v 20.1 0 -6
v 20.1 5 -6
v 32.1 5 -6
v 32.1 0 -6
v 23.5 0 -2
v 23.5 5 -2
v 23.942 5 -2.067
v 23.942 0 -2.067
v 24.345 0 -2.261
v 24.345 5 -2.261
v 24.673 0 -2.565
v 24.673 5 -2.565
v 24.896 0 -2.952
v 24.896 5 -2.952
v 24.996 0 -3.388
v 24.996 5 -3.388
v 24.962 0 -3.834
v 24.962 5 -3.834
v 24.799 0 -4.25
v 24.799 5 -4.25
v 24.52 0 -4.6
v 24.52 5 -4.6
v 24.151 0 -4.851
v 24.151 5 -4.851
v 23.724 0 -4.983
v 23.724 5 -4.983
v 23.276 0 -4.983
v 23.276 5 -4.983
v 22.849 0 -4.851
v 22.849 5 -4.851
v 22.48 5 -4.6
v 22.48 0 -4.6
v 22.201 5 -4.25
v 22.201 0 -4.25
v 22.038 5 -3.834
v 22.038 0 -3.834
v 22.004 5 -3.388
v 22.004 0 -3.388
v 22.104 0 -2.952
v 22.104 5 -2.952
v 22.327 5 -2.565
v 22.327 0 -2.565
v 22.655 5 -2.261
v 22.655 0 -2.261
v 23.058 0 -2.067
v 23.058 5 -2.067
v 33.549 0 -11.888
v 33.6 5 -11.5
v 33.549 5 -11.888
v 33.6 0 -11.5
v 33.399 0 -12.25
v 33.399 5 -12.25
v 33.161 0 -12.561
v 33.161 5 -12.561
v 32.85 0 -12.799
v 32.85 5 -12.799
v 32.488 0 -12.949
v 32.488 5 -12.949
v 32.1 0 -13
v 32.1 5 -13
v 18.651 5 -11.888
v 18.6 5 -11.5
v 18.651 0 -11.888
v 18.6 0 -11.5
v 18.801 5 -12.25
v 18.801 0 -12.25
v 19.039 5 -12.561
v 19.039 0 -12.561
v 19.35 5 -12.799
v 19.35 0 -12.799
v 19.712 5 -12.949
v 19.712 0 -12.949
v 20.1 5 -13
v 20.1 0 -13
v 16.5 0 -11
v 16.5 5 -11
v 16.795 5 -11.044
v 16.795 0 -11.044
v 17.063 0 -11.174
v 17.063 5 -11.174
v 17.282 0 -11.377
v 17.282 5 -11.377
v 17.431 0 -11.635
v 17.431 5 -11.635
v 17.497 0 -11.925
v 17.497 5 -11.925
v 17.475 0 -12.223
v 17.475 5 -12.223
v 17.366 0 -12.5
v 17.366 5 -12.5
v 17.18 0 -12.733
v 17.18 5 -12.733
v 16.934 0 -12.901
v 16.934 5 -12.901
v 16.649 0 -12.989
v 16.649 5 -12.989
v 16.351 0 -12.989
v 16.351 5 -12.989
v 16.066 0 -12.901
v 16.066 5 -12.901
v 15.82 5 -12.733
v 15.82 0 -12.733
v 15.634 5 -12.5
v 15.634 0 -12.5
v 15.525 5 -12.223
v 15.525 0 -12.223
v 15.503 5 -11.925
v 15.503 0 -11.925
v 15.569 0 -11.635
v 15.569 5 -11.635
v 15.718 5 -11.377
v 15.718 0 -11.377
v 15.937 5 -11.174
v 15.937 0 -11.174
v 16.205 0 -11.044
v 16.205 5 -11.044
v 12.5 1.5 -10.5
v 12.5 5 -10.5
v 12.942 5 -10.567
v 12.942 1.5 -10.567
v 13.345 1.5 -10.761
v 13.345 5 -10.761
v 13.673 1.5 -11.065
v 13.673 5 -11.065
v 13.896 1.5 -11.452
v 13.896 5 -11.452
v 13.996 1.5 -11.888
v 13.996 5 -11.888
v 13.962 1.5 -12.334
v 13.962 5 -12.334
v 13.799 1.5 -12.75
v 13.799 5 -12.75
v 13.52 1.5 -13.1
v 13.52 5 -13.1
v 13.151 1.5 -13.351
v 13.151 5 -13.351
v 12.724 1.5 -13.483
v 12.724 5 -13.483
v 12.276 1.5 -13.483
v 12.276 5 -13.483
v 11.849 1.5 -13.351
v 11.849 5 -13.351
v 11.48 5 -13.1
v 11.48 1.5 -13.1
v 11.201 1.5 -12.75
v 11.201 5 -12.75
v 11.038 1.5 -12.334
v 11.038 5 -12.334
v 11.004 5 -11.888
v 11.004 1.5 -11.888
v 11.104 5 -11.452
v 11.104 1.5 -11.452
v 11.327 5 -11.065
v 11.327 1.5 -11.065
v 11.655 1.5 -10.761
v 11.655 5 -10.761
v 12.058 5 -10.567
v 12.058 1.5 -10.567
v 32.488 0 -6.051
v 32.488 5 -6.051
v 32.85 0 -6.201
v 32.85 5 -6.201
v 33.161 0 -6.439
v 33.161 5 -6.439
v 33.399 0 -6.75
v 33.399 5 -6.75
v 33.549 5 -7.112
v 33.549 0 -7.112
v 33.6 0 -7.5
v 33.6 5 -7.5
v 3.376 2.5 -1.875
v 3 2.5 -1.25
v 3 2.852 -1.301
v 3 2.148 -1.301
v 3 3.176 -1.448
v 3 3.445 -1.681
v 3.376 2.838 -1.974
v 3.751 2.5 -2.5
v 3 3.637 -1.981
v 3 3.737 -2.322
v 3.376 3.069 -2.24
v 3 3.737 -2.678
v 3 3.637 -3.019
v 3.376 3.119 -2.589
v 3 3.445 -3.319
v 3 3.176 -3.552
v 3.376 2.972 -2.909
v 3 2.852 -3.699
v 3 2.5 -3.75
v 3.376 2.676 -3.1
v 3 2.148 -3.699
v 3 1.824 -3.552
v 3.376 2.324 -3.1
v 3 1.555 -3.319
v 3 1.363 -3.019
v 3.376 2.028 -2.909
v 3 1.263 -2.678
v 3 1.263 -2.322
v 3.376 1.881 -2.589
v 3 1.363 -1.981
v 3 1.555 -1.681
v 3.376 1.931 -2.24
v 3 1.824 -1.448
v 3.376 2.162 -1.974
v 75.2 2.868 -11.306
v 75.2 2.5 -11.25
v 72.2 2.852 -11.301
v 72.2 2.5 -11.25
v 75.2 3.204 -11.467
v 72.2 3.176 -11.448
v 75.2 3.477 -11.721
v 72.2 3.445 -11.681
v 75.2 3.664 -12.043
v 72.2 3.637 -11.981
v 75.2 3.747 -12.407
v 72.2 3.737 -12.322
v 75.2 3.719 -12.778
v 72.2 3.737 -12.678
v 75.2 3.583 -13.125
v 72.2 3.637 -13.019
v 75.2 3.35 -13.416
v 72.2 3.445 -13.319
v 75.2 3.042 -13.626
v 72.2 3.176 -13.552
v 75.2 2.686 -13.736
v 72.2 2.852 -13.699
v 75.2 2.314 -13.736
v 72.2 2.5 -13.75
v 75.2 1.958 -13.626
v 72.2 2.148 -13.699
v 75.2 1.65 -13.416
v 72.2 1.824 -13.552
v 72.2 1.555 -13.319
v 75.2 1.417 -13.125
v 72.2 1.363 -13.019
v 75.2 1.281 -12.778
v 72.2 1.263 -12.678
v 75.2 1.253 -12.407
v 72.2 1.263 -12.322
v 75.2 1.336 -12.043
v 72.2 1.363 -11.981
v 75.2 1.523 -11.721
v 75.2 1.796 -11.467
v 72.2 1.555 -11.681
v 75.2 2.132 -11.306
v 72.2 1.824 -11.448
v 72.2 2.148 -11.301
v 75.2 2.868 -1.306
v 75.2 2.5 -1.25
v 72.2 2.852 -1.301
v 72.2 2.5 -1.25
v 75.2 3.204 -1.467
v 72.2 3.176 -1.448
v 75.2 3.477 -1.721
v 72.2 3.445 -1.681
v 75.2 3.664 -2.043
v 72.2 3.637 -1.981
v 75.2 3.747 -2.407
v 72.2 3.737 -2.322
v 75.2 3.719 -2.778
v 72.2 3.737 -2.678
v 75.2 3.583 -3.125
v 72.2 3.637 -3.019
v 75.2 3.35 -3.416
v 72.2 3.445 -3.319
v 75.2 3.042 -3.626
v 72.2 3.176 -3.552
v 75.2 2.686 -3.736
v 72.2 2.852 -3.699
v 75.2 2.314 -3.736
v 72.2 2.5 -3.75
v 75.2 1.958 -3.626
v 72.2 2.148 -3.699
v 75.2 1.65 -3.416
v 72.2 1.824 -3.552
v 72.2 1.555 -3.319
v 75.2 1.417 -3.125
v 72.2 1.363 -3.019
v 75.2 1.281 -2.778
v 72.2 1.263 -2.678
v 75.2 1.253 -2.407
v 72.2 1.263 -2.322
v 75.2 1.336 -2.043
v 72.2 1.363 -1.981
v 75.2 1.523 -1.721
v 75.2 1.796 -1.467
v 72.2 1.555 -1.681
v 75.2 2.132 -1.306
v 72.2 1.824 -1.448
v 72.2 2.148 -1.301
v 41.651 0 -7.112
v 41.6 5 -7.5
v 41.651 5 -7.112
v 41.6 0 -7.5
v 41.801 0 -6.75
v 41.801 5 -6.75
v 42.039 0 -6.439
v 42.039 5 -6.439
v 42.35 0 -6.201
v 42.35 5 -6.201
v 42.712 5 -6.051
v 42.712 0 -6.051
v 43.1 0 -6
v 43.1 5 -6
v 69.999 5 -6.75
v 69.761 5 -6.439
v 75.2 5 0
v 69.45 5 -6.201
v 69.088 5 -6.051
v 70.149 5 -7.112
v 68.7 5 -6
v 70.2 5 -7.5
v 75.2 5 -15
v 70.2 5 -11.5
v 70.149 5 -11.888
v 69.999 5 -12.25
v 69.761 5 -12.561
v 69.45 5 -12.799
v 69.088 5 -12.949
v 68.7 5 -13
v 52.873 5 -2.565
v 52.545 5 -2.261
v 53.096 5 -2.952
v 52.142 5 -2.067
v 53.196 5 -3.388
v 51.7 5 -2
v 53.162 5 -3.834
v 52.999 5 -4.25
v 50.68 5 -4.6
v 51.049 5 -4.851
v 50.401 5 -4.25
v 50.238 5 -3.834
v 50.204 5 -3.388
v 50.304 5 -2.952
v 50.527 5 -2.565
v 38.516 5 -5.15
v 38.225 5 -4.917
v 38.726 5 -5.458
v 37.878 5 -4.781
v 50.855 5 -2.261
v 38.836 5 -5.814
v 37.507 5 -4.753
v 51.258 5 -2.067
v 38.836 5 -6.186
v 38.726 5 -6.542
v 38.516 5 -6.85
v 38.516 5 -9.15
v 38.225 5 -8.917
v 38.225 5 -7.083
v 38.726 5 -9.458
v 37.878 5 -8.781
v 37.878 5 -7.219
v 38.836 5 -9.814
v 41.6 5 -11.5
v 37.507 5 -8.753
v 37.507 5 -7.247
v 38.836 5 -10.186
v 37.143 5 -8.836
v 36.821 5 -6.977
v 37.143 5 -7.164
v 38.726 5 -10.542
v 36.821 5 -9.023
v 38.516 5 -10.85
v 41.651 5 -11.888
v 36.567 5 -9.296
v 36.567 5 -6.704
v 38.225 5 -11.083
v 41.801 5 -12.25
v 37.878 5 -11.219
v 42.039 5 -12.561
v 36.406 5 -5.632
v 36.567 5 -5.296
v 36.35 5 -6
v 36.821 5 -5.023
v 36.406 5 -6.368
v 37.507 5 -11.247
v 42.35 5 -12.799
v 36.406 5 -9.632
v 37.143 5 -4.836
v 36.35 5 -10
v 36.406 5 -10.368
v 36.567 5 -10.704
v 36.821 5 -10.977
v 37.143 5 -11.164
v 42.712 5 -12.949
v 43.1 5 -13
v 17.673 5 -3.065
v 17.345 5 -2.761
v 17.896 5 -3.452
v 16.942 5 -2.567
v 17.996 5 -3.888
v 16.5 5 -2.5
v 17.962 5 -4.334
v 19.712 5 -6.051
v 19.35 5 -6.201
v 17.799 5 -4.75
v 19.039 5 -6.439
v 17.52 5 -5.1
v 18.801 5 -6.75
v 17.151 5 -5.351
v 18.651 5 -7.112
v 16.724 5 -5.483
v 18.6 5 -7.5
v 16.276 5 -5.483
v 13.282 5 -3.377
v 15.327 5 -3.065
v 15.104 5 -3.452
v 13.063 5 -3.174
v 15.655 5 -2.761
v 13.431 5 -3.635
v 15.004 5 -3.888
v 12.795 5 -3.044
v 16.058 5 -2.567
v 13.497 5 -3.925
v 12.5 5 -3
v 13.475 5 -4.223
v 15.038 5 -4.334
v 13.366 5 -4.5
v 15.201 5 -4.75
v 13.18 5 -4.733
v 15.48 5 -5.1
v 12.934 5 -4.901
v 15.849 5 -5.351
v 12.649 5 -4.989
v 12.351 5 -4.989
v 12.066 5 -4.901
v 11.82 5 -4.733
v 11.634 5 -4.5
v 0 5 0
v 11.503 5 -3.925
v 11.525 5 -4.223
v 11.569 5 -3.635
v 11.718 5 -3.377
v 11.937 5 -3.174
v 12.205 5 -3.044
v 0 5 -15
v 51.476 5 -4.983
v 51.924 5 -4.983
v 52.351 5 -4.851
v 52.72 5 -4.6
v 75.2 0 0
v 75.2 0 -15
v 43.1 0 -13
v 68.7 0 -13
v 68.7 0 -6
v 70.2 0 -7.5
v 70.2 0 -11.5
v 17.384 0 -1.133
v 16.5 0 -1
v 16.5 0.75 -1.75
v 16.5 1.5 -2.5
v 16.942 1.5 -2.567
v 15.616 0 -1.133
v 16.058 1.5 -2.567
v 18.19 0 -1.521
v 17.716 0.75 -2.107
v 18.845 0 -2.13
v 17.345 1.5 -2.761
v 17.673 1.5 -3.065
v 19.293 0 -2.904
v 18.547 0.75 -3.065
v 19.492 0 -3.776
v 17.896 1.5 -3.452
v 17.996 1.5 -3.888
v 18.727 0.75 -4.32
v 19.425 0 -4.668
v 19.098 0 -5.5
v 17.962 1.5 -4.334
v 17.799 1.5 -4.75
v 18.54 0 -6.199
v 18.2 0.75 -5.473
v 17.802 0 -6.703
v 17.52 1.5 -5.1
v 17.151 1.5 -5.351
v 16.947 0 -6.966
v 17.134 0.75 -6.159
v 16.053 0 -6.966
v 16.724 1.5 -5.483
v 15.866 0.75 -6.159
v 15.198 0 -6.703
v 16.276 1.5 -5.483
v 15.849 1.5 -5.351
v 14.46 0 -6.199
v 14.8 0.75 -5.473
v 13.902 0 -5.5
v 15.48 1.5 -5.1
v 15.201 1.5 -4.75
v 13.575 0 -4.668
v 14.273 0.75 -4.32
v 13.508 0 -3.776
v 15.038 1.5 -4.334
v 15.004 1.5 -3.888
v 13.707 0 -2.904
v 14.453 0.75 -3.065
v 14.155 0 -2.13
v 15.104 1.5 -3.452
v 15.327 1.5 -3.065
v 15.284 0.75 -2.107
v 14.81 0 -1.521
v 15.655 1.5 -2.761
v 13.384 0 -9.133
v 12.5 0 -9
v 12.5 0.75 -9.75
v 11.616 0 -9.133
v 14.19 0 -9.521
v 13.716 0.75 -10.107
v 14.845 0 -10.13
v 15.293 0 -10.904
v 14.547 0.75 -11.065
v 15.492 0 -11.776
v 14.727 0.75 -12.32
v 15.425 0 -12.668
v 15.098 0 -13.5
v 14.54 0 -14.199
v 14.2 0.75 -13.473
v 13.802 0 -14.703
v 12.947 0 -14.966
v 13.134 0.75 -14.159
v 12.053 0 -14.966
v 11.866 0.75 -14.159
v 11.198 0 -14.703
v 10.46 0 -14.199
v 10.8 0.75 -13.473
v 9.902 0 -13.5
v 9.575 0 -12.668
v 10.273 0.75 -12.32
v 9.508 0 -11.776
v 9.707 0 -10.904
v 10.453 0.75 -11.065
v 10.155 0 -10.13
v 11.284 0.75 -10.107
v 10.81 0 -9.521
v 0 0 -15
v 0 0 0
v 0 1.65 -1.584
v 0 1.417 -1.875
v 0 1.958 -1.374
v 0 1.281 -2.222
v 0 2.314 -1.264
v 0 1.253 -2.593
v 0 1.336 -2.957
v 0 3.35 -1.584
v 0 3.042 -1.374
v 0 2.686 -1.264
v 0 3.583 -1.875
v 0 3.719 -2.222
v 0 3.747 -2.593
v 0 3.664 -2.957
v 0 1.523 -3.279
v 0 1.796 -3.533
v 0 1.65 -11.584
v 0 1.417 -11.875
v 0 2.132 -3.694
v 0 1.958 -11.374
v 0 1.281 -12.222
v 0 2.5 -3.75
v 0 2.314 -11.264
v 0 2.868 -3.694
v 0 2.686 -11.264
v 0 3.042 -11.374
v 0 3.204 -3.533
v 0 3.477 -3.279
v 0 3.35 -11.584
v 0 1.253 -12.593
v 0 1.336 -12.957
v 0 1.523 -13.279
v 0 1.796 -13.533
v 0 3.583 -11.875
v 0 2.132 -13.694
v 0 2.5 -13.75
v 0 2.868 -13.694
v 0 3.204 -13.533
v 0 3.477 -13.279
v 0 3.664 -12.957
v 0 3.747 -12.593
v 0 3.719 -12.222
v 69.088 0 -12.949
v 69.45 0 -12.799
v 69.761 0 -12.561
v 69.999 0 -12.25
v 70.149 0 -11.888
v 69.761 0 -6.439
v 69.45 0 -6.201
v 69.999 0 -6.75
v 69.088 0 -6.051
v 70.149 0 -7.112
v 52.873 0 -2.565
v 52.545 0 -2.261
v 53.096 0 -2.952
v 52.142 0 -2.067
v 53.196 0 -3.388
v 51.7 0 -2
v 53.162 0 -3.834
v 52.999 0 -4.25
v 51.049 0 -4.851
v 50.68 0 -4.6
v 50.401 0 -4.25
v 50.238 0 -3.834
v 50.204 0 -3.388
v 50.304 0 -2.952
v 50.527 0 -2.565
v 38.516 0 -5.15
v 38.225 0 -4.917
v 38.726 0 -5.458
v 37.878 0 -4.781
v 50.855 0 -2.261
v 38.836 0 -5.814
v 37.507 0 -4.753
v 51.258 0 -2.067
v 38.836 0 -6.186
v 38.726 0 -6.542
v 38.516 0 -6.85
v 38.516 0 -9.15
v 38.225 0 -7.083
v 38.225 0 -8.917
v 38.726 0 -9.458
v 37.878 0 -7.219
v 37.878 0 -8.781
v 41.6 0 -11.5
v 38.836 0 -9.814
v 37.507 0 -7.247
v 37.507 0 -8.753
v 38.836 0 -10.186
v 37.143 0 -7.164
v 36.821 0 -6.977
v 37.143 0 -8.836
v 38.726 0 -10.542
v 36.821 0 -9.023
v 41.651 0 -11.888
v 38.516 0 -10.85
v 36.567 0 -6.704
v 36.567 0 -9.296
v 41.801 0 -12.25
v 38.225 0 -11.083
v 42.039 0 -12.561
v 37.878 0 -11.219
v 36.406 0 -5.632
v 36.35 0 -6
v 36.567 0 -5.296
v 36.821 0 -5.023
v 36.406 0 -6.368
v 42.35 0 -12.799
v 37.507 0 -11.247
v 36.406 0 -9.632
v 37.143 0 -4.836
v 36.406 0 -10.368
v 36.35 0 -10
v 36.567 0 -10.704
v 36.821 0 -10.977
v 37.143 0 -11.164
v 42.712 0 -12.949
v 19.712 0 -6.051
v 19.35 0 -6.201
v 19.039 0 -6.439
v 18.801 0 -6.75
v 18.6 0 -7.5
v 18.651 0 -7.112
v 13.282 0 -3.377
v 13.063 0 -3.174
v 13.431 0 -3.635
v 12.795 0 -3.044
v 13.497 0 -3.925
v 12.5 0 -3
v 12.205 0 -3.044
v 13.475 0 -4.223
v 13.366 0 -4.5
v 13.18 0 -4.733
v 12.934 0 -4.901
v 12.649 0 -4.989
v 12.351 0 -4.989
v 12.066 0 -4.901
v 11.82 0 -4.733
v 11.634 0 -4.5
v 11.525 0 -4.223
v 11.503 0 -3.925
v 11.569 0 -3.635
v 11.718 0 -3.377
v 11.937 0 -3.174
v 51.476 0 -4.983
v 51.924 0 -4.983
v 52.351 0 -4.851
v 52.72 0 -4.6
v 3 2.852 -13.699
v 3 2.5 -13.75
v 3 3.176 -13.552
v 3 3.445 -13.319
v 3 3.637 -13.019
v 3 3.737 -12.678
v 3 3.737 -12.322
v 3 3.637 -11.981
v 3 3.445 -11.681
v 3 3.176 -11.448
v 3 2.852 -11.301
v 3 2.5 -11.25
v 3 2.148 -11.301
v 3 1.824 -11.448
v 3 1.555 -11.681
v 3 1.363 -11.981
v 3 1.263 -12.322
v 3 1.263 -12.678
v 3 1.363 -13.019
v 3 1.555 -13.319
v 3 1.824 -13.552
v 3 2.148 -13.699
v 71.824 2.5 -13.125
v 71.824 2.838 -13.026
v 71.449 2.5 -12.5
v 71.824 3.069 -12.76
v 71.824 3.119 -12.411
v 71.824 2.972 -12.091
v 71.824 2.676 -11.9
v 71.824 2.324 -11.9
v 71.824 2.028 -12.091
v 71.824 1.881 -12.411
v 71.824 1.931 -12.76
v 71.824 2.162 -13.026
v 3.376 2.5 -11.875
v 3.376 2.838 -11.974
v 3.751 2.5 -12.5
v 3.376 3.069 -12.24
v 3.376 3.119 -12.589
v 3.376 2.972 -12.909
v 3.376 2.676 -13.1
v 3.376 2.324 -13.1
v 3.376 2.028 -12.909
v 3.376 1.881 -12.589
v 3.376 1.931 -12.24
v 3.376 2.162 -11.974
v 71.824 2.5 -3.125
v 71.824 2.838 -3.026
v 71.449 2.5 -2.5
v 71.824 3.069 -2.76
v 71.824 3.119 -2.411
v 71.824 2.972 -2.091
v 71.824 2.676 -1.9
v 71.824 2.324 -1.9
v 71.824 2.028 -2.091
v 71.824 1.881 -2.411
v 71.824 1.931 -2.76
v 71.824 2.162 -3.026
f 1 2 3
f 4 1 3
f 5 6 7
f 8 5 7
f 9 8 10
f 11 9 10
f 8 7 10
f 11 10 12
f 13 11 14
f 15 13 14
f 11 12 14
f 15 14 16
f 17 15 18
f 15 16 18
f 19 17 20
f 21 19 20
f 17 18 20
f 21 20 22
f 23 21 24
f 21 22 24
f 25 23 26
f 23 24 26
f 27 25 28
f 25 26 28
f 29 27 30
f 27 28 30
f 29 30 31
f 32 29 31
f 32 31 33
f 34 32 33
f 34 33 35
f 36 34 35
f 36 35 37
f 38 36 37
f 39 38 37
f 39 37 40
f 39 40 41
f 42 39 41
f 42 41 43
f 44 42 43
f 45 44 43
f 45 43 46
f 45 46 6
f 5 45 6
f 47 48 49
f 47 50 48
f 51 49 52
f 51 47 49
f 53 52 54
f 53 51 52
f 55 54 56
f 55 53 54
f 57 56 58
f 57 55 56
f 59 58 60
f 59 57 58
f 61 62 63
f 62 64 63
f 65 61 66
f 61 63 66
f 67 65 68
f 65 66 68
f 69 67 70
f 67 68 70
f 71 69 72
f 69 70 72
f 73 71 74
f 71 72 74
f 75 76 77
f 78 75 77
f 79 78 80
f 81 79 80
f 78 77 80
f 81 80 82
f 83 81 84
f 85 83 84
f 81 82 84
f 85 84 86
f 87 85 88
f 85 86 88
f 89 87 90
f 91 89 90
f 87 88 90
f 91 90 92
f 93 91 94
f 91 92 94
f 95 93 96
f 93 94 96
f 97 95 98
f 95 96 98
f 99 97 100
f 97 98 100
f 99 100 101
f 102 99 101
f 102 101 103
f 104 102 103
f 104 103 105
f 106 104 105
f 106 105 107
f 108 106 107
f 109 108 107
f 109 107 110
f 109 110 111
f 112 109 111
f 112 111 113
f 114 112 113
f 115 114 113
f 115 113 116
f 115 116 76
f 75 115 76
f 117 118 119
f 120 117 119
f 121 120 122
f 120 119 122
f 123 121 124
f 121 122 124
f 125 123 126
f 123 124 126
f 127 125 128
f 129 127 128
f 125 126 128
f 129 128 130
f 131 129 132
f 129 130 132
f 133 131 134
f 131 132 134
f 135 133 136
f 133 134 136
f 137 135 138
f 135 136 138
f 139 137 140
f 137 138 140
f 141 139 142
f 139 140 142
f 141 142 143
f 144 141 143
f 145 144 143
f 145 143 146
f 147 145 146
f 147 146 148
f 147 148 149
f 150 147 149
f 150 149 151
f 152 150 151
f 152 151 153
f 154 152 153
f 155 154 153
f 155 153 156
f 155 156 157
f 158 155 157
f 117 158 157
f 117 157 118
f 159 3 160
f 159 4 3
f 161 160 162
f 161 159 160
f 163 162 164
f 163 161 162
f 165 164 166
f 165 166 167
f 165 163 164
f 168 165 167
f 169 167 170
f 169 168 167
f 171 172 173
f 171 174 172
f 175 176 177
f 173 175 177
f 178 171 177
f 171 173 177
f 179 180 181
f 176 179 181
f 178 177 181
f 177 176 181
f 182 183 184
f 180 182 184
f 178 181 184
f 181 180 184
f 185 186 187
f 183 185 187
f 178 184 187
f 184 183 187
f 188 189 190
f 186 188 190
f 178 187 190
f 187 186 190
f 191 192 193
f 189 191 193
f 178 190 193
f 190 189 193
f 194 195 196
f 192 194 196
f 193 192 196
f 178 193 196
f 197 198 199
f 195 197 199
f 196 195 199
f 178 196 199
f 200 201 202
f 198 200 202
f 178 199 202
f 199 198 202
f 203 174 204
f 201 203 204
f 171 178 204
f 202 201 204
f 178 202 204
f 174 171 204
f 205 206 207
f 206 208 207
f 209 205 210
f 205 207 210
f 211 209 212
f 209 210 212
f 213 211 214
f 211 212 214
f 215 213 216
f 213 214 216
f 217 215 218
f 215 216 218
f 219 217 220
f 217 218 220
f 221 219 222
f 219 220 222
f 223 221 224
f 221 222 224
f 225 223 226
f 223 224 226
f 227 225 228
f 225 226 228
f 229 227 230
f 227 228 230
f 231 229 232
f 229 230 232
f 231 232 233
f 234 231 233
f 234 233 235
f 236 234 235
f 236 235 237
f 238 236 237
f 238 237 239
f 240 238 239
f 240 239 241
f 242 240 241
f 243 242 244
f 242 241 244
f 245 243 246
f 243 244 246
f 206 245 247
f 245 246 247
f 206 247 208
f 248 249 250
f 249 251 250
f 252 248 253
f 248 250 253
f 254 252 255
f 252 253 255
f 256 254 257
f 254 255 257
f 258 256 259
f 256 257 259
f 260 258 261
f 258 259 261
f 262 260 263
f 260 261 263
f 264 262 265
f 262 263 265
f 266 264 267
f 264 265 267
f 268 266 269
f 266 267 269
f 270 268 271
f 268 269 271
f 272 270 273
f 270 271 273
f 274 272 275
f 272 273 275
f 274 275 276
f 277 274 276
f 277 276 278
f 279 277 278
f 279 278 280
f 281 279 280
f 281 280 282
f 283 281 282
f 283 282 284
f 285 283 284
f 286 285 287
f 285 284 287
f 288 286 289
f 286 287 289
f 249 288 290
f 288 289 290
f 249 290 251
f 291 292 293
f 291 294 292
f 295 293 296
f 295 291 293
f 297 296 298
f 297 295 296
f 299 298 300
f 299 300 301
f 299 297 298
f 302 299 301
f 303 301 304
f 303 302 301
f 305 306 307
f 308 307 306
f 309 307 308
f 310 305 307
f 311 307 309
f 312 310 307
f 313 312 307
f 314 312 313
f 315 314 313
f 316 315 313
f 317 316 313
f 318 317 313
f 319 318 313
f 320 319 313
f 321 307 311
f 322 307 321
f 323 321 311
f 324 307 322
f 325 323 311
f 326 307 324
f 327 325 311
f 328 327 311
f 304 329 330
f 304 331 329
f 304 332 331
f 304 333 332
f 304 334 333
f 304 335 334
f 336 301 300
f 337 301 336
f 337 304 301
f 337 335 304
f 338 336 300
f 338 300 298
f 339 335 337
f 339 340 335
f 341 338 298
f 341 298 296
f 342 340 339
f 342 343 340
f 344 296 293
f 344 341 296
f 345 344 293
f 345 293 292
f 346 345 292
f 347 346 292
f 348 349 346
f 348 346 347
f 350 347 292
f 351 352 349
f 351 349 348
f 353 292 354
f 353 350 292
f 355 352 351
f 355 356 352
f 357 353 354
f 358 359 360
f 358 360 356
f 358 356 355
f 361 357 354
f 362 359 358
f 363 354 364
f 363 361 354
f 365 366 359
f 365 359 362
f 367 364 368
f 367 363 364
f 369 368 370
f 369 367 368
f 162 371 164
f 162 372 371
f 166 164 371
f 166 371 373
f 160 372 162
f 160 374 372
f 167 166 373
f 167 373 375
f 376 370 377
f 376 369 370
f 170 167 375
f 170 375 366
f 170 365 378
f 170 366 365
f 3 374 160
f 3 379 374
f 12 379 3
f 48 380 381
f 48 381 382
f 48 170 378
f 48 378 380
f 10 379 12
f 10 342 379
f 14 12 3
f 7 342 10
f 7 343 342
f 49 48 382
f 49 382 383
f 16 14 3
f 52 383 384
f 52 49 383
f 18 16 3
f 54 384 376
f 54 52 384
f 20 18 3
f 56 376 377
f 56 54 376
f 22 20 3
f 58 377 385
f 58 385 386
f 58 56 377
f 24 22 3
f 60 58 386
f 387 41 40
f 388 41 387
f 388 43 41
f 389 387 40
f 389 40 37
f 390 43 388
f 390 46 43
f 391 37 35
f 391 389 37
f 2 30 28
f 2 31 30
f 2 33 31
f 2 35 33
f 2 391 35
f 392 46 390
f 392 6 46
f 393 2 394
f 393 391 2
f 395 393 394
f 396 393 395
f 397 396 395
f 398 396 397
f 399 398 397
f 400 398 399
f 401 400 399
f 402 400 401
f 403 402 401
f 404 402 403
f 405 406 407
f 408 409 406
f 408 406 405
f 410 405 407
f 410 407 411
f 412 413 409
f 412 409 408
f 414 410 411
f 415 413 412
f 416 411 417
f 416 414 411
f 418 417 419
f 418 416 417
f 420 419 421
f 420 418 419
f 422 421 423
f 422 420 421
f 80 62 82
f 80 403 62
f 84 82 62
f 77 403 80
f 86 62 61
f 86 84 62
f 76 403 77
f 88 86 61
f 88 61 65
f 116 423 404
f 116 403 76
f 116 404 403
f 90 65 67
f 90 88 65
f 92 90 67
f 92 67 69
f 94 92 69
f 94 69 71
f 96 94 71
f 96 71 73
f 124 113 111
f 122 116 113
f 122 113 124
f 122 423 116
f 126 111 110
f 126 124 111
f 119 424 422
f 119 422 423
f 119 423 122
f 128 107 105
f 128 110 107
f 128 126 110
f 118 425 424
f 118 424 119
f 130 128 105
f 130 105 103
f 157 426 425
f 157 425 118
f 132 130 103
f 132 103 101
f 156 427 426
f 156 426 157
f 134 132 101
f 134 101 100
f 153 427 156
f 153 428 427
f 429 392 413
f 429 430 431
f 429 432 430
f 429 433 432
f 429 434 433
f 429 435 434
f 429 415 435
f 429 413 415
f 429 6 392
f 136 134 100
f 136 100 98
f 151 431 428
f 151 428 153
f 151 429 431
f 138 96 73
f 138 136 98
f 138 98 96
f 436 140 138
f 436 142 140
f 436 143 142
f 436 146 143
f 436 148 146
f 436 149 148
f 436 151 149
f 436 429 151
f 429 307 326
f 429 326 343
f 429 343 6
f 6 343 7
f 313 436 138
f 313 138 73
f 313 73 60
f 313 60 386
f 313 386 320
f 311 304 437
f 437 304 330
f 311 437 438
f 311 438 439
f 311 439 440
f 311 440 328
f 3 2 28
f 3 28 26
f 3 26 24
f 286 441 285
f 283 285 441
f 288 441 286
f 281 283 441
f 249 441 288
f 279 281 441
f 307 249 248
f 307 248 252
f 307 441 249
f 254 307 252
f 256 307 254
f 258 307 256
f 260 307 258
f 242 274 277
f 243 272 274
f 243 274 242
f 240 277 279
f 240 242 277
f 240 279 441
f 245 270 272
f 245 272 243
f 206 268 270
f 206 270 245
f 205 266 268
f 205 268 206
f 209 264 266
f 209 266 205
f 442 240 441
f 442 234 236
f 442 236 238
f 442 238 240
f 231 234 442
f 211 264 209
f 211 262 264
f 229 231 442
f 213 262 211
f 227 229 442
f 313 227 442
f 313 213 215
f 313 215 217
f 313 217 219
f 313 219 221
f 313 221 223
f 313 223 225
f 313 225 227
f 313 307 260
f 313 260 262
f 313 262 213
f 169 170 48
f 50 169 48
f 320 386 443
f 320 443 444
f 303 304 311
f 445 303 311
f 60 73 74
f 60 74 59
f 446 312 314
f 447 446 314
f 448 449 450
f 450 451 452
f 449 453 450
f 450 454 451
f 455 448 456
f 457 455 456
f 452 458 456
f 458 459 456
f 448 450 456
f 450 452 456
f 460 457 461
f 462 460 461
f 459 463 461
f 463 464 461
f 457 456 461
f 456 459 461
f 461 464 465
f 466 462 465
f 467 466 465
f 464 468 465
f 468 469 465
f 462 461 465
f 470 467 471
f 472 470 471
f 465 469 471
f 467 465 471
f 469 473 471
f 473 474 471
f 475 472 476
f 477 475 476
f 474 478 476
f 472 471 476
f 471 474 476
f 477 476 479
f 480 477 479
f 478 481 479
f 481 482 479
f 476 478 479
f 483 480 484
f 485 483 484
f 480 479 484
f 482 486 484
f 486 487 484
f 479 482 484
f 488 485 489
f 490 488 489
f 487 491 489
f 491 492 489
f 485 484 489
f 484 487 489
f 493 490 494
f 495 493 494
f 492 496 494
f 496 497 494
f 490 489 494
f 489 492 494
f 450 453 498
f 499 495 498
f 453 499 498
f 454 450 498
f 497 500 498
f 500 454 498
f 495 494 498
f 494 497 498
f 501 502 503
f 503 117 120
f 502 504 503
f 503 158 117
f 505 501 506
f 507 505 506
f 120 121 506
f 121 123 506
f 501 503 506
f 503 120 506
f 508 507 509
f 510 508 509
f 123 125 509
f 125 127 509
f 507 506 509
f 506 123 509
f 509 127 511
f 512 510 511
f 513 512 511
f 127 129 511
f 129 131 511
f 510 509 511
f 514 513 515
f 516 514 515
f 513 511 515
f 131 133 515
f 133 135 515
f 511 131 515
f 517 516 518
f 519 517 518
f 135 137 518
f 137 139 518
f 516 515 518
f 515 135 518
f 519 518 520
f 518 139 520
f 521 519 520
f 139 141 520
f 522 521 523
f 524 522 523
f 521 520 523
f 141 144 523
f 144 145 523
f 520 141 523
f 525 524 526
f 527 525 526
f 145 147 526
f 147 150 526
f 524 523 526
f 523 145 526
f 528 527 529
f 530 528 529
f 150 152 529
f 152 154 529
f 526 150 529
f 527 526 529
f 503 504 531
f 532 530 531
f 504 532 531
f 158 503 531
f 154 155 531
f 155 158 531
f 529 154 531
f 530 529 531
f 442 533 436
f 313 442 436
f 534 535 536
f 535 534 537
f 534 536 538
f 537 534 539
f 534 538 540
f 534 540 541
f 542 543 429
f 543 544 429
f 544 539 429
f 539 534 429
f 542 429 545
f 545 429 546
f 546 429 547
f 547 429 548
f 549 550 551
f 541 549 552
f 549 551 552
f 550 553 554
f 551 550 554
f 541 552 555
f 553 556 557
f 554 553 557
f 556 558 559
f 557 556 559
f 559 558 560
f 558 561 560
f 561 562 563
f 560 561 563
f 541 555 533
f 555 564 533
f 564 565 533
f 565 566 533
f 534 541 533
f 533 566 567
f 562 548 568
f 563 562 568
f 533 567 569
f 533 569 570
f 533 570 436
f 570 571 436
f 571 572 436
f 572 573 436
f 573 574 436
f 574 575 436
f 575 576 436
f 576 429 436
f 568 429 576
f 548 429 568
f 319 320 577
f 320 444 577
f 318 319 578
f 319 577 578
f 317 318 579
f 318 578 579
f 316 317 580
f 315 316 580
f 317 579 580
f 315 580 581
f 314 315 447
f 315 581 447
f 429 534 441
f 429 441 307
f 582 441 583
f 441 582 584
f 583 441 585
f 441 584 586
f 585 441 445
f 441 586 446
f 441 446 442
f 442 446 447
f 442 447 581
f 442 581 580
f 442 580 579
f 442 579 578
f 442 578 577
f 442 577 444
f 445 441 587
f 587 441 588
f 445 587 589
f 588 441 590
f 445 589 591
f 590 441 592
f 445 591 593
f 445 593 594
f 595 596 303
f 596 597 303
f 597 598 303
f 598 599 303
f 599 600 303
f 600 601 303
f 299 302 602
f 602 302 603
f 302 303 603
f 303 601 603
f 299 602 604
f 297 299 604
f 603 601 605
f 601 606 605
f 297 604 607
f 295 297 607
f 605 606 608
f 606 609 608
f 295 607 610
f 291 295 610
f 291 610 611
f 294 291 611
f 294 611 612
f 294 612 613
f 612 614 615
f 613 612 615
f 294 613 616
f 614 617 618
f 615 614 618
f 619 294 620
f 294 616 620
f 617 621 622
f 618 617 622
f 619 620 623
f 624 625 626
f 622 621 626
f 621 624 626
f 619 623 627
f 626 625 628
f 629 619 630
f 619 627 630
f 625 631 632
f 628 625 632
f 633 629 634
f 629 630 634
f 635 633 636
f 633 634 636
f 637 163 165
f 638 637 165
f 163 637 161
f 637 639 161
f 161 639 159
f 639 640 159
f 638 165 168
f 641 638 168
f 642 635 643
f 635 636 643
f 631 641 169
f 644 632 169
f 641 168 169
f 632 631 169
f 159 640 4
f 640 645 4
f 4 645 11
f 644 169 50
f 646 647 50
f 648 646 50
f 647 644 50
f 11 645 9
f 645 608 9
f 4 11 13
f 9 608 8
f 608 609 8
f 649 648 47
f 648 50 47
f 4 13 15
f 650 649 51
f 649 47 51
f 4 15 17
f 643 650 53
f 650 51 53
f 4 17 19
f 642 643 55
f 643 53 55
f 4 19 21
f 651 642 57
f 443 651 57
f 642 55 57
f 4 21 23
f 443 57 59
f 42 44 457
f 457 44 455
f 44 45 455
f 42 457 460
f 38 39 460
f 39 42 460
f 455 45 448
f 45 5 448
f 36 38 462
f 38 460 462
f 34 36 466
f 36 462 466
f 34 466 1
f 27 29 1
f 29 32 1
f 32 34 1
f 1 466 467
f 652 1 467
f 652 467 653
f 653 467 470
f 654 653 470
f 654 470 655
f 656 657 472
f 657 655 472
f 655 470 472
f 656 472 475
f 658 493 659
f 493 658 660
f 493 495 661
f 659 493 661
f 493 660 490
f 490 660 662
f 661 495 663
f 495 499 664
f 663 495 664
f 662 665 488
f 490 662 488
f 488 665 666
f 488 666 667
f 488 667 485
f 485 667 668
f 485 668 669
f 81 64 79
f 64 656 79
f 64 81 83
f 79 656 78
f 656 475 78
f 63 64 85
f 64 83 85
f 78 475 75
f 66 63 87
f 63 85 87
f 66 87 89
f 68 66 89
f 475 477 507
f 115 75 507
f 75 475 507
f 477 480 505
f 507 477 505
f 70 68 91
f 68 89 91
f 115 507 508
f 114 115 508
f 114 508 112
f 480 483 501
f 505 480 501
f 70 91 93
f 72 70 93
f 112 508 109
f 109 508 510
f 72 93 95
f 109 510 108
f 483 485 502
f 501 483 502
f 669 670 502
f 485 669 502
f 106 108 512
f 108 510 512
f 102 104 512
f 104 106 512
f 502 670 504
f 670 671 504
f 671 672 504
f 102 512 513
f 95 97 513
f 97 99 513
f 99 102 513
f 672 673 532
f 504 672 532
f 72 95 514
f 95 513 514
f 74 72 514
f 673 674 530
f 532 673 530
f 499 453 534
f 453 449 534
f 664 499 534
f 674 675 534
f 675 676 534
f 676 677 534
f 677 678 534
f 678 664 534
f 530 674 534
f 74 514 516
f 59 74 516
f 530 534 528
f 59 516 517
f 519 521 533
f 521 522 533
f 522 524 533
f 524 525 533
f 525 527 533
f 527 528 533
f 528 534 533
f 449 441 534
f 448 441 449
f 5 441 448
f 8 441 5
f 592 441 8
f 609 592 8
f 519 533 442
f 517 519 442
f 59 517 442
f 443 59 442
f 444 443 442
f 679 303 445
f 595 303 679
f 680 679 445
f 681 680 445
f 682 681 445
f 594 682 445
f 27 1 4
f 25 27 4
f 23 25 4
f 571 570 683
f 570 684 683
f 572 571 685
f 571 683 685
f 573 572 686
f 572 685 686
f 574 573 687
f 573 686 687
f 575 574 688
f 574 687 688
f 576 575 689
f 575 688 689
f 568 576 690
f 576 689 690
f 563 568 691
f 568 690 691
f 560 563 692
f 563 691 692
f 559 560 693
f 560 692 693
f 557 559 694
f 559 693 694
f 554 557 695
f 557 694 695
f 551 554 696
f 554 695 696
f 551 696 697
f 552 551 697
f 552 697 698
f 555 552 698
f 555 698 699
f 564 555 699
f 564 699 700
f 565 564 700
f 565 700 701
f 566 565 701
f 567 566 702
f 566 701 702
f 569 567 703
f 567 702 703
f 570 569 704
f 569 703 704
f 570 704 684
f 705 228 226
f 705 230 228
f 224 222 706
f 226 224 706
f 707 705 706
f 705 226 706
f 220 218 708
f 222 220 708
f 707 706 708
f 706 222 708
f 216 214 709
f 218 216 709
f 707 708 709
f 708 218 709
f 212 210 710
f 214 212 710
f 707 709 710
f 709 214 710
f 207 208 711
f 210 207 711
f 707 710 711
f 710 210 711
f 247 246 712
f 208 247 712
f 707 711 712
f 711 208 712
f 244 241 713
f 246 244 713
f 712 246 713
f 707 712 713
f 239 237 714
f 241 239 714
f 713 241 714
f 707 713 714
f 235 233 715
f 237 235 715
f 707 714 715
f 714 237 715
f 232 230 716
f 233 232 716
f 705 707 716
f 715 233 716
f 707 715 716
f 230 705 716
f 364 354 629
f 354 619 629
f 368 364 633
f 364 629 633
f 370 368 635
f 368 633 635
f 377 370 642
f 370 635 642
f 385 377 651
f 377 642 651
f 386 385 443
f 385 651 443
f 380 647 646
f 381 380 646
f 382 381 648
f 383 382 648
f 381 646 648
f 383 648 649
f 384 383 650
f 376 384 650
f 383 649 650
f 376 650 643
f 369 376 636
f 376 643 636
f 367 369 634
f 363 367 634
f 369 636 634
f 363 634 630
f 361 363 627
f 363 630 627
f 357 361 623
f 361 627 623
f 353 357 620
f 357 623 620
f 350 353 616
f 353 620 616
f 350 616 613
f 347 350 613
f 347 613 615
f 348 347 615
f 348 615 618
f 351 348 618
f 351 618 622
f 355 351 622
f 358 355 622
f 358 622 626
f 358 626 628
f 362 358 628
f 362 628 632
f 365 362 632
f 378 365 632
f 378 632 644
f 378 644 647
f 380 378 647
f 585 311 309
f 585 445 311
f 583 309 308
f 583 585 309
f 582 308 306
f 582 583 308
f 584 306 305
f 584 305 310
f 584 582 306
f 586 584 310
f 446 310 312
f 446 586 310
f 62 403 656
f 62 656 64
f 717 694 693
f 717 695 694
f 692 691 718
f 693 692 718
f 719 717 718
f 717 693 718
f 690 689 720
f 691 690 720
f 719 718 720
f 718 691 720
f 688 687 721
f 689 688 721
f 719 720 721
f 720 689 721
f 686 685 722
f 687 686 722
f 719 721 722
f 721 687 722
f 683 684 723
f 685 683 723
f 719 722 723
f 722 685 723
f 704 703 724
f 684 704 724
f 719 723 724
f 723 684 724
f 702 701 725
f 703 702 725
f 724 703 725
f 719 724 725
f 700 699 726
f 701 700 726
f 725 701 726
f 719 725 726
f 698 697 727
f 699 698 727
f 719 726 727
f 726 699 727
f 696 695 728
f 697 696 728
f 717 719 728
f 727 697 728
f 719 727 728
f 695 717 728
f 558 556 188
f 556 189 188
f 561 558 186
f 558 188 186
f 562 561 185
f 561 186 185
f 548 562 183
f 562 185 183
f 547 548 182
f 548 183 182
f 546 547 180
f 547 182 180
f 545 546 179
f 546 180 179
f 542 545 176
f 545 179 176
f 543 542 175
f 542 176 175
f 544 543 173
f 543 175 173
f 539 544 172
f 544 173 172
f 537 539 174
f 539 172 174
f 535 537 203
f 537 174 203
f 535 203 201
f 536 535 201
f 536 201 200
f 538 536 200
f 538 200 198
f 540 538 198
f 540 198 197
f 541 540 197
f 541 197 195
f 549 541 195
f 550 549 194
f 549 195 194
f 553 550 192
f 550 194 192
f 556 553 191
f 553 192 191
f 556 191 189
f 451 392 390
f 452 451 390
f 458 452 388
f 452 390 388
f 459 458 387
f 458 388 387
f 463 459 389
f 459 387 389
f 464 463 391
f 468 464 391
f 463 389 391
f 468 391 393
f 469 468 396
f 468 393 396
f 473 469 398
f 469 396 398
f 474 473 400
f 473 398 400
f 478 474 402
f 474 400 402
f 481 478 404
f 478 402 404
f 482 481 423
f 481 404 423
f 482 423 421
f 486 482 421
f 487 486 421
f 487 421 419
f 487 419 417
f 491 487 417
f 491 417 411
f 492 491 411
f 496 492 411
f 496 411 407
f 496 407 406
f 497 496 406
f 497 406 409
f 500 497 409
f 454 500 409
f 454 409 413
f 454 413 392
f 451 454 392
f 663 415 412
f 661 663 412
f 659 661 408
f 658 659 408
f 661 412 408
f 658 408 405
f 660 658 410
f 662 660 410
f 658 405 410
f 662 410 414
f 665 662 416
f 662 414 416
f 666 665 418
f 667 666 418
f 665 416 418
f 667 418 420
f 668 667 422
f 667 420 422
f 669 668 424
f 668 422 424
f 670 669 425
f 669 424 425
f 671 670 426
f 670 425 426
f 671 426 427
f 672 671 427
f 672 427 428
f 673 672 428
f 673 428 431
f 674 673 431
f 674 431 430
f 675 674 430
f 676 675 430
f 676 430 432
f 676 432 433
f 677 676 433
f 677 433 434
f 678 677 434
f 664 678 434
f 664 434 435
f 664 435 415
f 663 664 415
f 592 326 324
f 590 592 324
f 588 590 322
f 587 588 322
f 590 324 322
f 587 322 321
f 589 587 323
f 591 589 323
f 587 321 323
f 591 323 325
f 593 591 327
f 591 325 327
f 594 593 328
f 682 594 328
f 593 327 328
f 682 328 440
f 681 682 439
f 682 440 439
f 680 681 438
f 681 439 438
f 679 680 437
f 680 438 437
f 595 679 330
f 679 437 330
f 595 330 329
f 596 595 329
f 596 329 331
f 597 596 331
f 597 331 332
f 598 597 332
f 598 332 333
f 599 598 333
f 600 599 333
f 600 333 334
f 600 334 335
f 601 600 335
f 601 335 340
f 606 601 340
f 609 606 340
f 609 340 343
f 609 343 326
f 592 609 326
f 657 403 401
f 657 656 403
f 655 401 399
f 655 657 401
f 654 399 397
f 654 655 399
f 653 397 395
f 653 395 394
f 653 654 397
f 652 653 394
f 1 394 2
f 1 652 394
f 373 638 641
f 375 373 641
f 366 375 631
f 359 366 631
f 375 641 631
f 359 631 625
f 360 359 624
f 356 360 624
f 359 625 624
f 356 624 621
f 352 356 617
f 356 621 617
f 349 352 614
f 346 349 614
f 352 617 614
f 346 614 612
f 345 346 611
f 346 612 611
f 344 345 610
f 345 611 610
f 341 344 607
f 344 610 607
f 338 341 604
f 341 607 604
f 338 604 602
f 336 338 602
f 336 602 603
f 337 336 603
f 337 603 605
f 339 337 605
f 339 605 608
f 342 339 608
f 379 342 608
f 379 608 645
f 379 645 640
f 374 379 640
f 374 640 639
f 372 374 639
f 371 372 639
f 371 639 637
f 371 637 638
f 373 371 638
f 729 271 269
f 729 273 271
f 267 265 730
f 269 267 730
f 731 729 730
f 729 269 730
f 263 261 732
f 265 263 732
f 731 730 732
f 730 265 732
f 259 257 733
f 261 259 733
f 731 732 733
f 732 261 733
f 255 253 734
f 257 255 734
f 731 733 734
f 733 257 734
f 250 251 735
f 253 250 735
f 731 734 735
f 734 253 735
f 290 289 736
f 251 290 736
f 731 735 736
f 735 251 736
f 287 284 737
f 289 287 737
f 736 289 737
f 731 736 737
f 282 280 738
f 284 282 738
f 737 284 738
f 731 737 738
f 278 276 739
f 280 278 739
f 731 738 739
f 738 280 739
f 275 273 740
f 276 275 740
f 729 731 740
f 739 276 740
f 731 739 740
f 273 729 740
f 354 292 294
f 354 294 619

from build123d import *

# Parameters (mm, degrees)
SKETCH1_W                       = 15
SKETCH1_H                       = 5
BOSS_EXTRUDE1_DEPTH             = 75.2
TAP_DRILL_FOR_M3X0_5_TAP1_D     = 2.5
TAP_DRILL_FOR_M3X0_5_TAP1_DEPTH = 3
TAP_DRILL_FOR_M3X0_5_TAP1_TIP   = 0.751075774
TAP_DRILL_FOR_M3X0_5_TAP2_D     = 2.5
TAP_DRILL_FOR_M3X0_5_TAP2_DEPTH = 3
TAP_DRILL_FOR_M3X0_5_TAP2_TIP   = 0.751075774
CUT_EXTRUDE1_REACH              = 78.844
SKETCH6_R                       = 1.5
SKETCH6_R_2                     = 1
SKETCH6_W                       = 28.6
SKETCH6_H                       = 7
SKETCH6_W_2                     = 15
FILLET1_R                       = 1.5
CHAMFER1_SIZE                   = 1.5
TAP_DRILL_FOR_M3X0_5_TAP3_D     = 2.5


with BuildPart() as part:
    # Sketch1 → Boss-Extrude1 (new body)
    with BuildSketch(Plane(origin=(0, 0, 0), x_dir=(0, 0, -1), z_dir=(1, 0, 0))):
        with Locations((7.5, 2.5)):
            Rectangle(SKETCH1_W, SKETCH1_H)
    extrude(amount=BOSS_EXTRUDE1_DEPTH)

    # Tap Drill for M3x0.5 Tap1
    with Locations(Plane(origin=(75.2, 0, 0), x_dir=(0, 0, -1), z_dir=(1, 0, 0))):
        with Locations((2.5, 2.5), (12.5, 2.5)):
            Hole(TAP_DRILL_FOR_M3X0_5_TAP1_D / 2, depth=TAP_DRILL_FOR_M3X0_5_TAP1_DEPTH)
            with Locations((0, 0, -(TAP_DRILL_FOR_M3X0_5_TAP1_DEPTH + TAP_DRILL_FOR_M3X0_5_TAP1_TIP / 2))):  # 118° drill point
                Cone(0, TAP_DRILL_FOR_M3X0_5_TAP1_D / 2, TAP_DRILL_FOR_M3X0_5_TAP1_TIP, mode=Mode.SUBTRACT)

    # Tap Drill for M3x0.5 Tap2
    with Locations(Plane.ZY):
        with Locations((-2.5, 2.5), (-12.5, 2.5)):
            Hole(TAP_DRILL_FOR_M3X0_5_TAP2_D / 2, depth=TAP_DRILL_FOR_M3X0_5_TAP2_DEPTH)
            with Locations((0, 0, -(TAP_DRILL_FOR_M3X0_5_TAP2_DEPTH + TAP_DRILL_FOR_M3X0_5_TAP2_TIP / 2))):  # 118° drill point
                Cone(0, TAP_DRILL_FOR_M3X0_5_TAP2_D / 2, TAP_DRILL_FOR_M3X0_5_TAP2_TIP, mode=Mode.SUBTRACT)

    # Sketch6 → Cut-Extrude1 (cut, up to next)
    with BuildSketch(Plane(origin=(0, 5, 0), x_dir=(1, 0, 0), z_dir=(0, 1, 0)), mode=Mode.PRIVATE) as cut_extrude1_sk1:
        with Locations(Location((23.5, 3.5, 0), (0, 0, 270))):
            Circle(SKETCH6_R)
    cut_extrude1_tool1 = extrude(cut_extrude1_sk1.sketch, amount=-CUT_EXTRUDE1_REACH, mode=Mode.PRIVATE) & part.part
    # Sketch6 → Cut-Extrude1 (cut, up to next)
    with BuildSketch(Plane(origin=(0, 5, 0), x_dir=(1, 0, 0), z_dir=(0, 1, 0)), mode=Mode.PRIVATE) as cut_extrude1_sk2:
        with Locations(Location((51.7, 3.5, 0), (0, 0, 270))):
            Circle(SKETCH6_R)
    cut_extrude1_tool2 = extrude(cut_extrude1_sk2.sketch, amount=-CUT_EXTRUDE1_REACH, mode=Mode.PRIVATE) & part.part
    # Sketch6 → Cut-Extrude1 (cut, up to next)
    with BuildSketch(Plane(origin=(0, 5, 0), x_dir=(1, 0, 0), z_dir=(0, 1, 0)), mode=Mode.PRIVATE) as cut_extrude1_sk3:
        with Locations(Location((12.5, 12, 0), (0, 0, 270))):
            Circle(SKETCH6_R)
    cut_extrude1_tool3 = extrude(cut_extrude1_sk3.sketch, amount=-CUT_EXTRUDE1_REACH, mode=Mode.PRIVATE) & part.part
    # Sketch6 → Cut-Extrude1 (cut, up to next)
    with BuildSketch(Plane(origin=(0, 5, 0), x_dir=(1, 0, 0), z_dir=(0, 1, 0)), mode=Mode.PRIVATE) as cut_extrude1_sk4:
        with Locations(Location((16.5, 12, 0), (0, 0, 270))):
            Circle(SKETCH6_R_2)
    cut_extrude1_tool4 = extrude(cut_extrude1_sk4.sketch, amount=-CUT_EXTRUDE1_REACH, mode=Mode.PRIVATE) & part.part
    # Sketch6 → Cut-Extrude1 (cut, up to next)
    with BuildSketch(Plane(origin=(0, 5, 0), x_dir=(1, 0, 0), z_dir=(0, 1, 0)), mode=Mode.PRIVATE) as cut_extrude1_sk5:
        with Locations(Location((12.5, 4, 0), (0, 0, 270))):
            Circle(SKETCH6_R_2)
    cut_extrude1_tool5 = extrude(cut_extrude1_sk5.sketch, amount=-CUT_EXTRUDE1_REACH, mode=Mode.PRIVATE) & part.part
    # Sketch6 → Cut-Extrude1 (cut, up to next)
    with BuildSketch(Plane(origin=(0, 5, 0), x_dir=(1, 0, 0), z_dir=(0, 1, 0)), mode=Mode.PRIVATE) as cut_extrude1_sk6:
        with Locations(Location((16.5, 4, 0), (0, 0, 270))):
            Circle(SKETCH6_R)
    cut_extrude1_tool6 = extrude(cut_extrude1_sk6.sketch, amount=-CUT_EXTRUDE1_REACH, mode=Mode.PRIVATE) & part.part
    # Sketch6 → Cut-Extrude1 (cut, up to next)
    with BuildSketch(Plane(origin=(0, 5, 0), x_dir=(1, 0, 0), z_dir=(0, 1, 0)), mode=Mode.PRIVATE) as cut_extrude1_sk7:
        with Locations((55.9, 9.5)):
            Rectangle(SKETCH6_W, SKETCH6_H)
    cut_extrude1_tool7 = extrude(cut_extrude1_sk7.sketch, amount=-CUT_EXTRUDE1_REACH, mode=Mode.PRIVATE) & part.part
    # Sketch6 → Cut-Extrude1 (cut, up to next)
    with BuildSketch(Plane(origin=(0, 5, 0), x_dir=(1, 0, 0), z_dir=(0, 1, 0)), mode=Mode.PRIVATE) as cut_extrude1_sk8:
        with Locations((26.1, 9.5)):
            Rectangle(SKETCH6_W_2, SKETCH6_H)
    cut_extrude1_tool8 = extrude(cut_extrude1_sk8.sketch, amount=-CUT_EXTRUDE1_REACH, mode=Mode.PRIVATE) & part.part
    add(cut_extrude1_tool1.solids().sort_by_distance((23.5, 5, -3.5))[0], mode=Mode.SUBTRACT)
    add(cut_extrude1_tool2.solids().sort_by_distance((51.7, 5, -3.5))[0], mode=Mode.SUBTRACT)
    add(cut_extrude1_tool3.solids().sort_by_distance((12.5, 5, -12))[0], mode=Mode.SUBTRACT)
    add(cut_extrude1_tool4.solids().sort_by_distance((16.5, 5, -12))[0], mode=Mode.SUBTRACT)
    add(cut_extrude1_tool5.solids().sort_by_distance((12.5, 5, -4))[0], mode=Mode.SUBTRACT)
    add(cut_extrude1_tool6.solids().sort_by_distance((16.5, 5, -4))[0], mode=Mode.SUBTRACT)
    add(cut_extrude1_tool7.solids().sort_by_distance((55.9, 5, -9.5))[0], mode=Mode.SUBTRACT)
    add(cut_extrude1_tool8.solids().sort_by_distance((26.1, 5, -9.5))[0], mode=Mode.SUBTRACT)

    # Fillet1
    fillet1_edges = [part.edges().sort_by_distance(p)[0] for p in [
        (70.2, 2.5, -13),
        (70.2, 2.5, -6),
        (41.6, 2.5, -6),
        (41.6, 2.5, -13),
        (18.6, 2.5, -6),
        (18.6, 2.5, -13),
        (33.6, 2.5, -13),
        (33.6, 2.5, -6),
    ]]
    fillet(fillet1_edges, radius=FILLET1_R)

    # Chamfer1
    chamfer1_edges = [part.edges().sort_by_distance(p)[0] for p in [
        (12.5, 0, -13.5),
        (16.5, 0, -5.5),
    ]]
    chamfer(chamfer1_edges, length=CHAMFER1_SIZE - 0.0001)  # a hair under: the kernel refuses the full size

    # Tap Drill for M3x0.5 Tap3 (through all)
    with Locations(Plane(origin=(0, 5, 0), x_dir=(1, 0, 0), z_dir=(0, 1, 0))):
        with Locations((37.6, 10), (37.6, 6)):
            Hole(TAP_DRILL_FOR_M3X0_5_TAP3_D / 2)


solid = part.part
